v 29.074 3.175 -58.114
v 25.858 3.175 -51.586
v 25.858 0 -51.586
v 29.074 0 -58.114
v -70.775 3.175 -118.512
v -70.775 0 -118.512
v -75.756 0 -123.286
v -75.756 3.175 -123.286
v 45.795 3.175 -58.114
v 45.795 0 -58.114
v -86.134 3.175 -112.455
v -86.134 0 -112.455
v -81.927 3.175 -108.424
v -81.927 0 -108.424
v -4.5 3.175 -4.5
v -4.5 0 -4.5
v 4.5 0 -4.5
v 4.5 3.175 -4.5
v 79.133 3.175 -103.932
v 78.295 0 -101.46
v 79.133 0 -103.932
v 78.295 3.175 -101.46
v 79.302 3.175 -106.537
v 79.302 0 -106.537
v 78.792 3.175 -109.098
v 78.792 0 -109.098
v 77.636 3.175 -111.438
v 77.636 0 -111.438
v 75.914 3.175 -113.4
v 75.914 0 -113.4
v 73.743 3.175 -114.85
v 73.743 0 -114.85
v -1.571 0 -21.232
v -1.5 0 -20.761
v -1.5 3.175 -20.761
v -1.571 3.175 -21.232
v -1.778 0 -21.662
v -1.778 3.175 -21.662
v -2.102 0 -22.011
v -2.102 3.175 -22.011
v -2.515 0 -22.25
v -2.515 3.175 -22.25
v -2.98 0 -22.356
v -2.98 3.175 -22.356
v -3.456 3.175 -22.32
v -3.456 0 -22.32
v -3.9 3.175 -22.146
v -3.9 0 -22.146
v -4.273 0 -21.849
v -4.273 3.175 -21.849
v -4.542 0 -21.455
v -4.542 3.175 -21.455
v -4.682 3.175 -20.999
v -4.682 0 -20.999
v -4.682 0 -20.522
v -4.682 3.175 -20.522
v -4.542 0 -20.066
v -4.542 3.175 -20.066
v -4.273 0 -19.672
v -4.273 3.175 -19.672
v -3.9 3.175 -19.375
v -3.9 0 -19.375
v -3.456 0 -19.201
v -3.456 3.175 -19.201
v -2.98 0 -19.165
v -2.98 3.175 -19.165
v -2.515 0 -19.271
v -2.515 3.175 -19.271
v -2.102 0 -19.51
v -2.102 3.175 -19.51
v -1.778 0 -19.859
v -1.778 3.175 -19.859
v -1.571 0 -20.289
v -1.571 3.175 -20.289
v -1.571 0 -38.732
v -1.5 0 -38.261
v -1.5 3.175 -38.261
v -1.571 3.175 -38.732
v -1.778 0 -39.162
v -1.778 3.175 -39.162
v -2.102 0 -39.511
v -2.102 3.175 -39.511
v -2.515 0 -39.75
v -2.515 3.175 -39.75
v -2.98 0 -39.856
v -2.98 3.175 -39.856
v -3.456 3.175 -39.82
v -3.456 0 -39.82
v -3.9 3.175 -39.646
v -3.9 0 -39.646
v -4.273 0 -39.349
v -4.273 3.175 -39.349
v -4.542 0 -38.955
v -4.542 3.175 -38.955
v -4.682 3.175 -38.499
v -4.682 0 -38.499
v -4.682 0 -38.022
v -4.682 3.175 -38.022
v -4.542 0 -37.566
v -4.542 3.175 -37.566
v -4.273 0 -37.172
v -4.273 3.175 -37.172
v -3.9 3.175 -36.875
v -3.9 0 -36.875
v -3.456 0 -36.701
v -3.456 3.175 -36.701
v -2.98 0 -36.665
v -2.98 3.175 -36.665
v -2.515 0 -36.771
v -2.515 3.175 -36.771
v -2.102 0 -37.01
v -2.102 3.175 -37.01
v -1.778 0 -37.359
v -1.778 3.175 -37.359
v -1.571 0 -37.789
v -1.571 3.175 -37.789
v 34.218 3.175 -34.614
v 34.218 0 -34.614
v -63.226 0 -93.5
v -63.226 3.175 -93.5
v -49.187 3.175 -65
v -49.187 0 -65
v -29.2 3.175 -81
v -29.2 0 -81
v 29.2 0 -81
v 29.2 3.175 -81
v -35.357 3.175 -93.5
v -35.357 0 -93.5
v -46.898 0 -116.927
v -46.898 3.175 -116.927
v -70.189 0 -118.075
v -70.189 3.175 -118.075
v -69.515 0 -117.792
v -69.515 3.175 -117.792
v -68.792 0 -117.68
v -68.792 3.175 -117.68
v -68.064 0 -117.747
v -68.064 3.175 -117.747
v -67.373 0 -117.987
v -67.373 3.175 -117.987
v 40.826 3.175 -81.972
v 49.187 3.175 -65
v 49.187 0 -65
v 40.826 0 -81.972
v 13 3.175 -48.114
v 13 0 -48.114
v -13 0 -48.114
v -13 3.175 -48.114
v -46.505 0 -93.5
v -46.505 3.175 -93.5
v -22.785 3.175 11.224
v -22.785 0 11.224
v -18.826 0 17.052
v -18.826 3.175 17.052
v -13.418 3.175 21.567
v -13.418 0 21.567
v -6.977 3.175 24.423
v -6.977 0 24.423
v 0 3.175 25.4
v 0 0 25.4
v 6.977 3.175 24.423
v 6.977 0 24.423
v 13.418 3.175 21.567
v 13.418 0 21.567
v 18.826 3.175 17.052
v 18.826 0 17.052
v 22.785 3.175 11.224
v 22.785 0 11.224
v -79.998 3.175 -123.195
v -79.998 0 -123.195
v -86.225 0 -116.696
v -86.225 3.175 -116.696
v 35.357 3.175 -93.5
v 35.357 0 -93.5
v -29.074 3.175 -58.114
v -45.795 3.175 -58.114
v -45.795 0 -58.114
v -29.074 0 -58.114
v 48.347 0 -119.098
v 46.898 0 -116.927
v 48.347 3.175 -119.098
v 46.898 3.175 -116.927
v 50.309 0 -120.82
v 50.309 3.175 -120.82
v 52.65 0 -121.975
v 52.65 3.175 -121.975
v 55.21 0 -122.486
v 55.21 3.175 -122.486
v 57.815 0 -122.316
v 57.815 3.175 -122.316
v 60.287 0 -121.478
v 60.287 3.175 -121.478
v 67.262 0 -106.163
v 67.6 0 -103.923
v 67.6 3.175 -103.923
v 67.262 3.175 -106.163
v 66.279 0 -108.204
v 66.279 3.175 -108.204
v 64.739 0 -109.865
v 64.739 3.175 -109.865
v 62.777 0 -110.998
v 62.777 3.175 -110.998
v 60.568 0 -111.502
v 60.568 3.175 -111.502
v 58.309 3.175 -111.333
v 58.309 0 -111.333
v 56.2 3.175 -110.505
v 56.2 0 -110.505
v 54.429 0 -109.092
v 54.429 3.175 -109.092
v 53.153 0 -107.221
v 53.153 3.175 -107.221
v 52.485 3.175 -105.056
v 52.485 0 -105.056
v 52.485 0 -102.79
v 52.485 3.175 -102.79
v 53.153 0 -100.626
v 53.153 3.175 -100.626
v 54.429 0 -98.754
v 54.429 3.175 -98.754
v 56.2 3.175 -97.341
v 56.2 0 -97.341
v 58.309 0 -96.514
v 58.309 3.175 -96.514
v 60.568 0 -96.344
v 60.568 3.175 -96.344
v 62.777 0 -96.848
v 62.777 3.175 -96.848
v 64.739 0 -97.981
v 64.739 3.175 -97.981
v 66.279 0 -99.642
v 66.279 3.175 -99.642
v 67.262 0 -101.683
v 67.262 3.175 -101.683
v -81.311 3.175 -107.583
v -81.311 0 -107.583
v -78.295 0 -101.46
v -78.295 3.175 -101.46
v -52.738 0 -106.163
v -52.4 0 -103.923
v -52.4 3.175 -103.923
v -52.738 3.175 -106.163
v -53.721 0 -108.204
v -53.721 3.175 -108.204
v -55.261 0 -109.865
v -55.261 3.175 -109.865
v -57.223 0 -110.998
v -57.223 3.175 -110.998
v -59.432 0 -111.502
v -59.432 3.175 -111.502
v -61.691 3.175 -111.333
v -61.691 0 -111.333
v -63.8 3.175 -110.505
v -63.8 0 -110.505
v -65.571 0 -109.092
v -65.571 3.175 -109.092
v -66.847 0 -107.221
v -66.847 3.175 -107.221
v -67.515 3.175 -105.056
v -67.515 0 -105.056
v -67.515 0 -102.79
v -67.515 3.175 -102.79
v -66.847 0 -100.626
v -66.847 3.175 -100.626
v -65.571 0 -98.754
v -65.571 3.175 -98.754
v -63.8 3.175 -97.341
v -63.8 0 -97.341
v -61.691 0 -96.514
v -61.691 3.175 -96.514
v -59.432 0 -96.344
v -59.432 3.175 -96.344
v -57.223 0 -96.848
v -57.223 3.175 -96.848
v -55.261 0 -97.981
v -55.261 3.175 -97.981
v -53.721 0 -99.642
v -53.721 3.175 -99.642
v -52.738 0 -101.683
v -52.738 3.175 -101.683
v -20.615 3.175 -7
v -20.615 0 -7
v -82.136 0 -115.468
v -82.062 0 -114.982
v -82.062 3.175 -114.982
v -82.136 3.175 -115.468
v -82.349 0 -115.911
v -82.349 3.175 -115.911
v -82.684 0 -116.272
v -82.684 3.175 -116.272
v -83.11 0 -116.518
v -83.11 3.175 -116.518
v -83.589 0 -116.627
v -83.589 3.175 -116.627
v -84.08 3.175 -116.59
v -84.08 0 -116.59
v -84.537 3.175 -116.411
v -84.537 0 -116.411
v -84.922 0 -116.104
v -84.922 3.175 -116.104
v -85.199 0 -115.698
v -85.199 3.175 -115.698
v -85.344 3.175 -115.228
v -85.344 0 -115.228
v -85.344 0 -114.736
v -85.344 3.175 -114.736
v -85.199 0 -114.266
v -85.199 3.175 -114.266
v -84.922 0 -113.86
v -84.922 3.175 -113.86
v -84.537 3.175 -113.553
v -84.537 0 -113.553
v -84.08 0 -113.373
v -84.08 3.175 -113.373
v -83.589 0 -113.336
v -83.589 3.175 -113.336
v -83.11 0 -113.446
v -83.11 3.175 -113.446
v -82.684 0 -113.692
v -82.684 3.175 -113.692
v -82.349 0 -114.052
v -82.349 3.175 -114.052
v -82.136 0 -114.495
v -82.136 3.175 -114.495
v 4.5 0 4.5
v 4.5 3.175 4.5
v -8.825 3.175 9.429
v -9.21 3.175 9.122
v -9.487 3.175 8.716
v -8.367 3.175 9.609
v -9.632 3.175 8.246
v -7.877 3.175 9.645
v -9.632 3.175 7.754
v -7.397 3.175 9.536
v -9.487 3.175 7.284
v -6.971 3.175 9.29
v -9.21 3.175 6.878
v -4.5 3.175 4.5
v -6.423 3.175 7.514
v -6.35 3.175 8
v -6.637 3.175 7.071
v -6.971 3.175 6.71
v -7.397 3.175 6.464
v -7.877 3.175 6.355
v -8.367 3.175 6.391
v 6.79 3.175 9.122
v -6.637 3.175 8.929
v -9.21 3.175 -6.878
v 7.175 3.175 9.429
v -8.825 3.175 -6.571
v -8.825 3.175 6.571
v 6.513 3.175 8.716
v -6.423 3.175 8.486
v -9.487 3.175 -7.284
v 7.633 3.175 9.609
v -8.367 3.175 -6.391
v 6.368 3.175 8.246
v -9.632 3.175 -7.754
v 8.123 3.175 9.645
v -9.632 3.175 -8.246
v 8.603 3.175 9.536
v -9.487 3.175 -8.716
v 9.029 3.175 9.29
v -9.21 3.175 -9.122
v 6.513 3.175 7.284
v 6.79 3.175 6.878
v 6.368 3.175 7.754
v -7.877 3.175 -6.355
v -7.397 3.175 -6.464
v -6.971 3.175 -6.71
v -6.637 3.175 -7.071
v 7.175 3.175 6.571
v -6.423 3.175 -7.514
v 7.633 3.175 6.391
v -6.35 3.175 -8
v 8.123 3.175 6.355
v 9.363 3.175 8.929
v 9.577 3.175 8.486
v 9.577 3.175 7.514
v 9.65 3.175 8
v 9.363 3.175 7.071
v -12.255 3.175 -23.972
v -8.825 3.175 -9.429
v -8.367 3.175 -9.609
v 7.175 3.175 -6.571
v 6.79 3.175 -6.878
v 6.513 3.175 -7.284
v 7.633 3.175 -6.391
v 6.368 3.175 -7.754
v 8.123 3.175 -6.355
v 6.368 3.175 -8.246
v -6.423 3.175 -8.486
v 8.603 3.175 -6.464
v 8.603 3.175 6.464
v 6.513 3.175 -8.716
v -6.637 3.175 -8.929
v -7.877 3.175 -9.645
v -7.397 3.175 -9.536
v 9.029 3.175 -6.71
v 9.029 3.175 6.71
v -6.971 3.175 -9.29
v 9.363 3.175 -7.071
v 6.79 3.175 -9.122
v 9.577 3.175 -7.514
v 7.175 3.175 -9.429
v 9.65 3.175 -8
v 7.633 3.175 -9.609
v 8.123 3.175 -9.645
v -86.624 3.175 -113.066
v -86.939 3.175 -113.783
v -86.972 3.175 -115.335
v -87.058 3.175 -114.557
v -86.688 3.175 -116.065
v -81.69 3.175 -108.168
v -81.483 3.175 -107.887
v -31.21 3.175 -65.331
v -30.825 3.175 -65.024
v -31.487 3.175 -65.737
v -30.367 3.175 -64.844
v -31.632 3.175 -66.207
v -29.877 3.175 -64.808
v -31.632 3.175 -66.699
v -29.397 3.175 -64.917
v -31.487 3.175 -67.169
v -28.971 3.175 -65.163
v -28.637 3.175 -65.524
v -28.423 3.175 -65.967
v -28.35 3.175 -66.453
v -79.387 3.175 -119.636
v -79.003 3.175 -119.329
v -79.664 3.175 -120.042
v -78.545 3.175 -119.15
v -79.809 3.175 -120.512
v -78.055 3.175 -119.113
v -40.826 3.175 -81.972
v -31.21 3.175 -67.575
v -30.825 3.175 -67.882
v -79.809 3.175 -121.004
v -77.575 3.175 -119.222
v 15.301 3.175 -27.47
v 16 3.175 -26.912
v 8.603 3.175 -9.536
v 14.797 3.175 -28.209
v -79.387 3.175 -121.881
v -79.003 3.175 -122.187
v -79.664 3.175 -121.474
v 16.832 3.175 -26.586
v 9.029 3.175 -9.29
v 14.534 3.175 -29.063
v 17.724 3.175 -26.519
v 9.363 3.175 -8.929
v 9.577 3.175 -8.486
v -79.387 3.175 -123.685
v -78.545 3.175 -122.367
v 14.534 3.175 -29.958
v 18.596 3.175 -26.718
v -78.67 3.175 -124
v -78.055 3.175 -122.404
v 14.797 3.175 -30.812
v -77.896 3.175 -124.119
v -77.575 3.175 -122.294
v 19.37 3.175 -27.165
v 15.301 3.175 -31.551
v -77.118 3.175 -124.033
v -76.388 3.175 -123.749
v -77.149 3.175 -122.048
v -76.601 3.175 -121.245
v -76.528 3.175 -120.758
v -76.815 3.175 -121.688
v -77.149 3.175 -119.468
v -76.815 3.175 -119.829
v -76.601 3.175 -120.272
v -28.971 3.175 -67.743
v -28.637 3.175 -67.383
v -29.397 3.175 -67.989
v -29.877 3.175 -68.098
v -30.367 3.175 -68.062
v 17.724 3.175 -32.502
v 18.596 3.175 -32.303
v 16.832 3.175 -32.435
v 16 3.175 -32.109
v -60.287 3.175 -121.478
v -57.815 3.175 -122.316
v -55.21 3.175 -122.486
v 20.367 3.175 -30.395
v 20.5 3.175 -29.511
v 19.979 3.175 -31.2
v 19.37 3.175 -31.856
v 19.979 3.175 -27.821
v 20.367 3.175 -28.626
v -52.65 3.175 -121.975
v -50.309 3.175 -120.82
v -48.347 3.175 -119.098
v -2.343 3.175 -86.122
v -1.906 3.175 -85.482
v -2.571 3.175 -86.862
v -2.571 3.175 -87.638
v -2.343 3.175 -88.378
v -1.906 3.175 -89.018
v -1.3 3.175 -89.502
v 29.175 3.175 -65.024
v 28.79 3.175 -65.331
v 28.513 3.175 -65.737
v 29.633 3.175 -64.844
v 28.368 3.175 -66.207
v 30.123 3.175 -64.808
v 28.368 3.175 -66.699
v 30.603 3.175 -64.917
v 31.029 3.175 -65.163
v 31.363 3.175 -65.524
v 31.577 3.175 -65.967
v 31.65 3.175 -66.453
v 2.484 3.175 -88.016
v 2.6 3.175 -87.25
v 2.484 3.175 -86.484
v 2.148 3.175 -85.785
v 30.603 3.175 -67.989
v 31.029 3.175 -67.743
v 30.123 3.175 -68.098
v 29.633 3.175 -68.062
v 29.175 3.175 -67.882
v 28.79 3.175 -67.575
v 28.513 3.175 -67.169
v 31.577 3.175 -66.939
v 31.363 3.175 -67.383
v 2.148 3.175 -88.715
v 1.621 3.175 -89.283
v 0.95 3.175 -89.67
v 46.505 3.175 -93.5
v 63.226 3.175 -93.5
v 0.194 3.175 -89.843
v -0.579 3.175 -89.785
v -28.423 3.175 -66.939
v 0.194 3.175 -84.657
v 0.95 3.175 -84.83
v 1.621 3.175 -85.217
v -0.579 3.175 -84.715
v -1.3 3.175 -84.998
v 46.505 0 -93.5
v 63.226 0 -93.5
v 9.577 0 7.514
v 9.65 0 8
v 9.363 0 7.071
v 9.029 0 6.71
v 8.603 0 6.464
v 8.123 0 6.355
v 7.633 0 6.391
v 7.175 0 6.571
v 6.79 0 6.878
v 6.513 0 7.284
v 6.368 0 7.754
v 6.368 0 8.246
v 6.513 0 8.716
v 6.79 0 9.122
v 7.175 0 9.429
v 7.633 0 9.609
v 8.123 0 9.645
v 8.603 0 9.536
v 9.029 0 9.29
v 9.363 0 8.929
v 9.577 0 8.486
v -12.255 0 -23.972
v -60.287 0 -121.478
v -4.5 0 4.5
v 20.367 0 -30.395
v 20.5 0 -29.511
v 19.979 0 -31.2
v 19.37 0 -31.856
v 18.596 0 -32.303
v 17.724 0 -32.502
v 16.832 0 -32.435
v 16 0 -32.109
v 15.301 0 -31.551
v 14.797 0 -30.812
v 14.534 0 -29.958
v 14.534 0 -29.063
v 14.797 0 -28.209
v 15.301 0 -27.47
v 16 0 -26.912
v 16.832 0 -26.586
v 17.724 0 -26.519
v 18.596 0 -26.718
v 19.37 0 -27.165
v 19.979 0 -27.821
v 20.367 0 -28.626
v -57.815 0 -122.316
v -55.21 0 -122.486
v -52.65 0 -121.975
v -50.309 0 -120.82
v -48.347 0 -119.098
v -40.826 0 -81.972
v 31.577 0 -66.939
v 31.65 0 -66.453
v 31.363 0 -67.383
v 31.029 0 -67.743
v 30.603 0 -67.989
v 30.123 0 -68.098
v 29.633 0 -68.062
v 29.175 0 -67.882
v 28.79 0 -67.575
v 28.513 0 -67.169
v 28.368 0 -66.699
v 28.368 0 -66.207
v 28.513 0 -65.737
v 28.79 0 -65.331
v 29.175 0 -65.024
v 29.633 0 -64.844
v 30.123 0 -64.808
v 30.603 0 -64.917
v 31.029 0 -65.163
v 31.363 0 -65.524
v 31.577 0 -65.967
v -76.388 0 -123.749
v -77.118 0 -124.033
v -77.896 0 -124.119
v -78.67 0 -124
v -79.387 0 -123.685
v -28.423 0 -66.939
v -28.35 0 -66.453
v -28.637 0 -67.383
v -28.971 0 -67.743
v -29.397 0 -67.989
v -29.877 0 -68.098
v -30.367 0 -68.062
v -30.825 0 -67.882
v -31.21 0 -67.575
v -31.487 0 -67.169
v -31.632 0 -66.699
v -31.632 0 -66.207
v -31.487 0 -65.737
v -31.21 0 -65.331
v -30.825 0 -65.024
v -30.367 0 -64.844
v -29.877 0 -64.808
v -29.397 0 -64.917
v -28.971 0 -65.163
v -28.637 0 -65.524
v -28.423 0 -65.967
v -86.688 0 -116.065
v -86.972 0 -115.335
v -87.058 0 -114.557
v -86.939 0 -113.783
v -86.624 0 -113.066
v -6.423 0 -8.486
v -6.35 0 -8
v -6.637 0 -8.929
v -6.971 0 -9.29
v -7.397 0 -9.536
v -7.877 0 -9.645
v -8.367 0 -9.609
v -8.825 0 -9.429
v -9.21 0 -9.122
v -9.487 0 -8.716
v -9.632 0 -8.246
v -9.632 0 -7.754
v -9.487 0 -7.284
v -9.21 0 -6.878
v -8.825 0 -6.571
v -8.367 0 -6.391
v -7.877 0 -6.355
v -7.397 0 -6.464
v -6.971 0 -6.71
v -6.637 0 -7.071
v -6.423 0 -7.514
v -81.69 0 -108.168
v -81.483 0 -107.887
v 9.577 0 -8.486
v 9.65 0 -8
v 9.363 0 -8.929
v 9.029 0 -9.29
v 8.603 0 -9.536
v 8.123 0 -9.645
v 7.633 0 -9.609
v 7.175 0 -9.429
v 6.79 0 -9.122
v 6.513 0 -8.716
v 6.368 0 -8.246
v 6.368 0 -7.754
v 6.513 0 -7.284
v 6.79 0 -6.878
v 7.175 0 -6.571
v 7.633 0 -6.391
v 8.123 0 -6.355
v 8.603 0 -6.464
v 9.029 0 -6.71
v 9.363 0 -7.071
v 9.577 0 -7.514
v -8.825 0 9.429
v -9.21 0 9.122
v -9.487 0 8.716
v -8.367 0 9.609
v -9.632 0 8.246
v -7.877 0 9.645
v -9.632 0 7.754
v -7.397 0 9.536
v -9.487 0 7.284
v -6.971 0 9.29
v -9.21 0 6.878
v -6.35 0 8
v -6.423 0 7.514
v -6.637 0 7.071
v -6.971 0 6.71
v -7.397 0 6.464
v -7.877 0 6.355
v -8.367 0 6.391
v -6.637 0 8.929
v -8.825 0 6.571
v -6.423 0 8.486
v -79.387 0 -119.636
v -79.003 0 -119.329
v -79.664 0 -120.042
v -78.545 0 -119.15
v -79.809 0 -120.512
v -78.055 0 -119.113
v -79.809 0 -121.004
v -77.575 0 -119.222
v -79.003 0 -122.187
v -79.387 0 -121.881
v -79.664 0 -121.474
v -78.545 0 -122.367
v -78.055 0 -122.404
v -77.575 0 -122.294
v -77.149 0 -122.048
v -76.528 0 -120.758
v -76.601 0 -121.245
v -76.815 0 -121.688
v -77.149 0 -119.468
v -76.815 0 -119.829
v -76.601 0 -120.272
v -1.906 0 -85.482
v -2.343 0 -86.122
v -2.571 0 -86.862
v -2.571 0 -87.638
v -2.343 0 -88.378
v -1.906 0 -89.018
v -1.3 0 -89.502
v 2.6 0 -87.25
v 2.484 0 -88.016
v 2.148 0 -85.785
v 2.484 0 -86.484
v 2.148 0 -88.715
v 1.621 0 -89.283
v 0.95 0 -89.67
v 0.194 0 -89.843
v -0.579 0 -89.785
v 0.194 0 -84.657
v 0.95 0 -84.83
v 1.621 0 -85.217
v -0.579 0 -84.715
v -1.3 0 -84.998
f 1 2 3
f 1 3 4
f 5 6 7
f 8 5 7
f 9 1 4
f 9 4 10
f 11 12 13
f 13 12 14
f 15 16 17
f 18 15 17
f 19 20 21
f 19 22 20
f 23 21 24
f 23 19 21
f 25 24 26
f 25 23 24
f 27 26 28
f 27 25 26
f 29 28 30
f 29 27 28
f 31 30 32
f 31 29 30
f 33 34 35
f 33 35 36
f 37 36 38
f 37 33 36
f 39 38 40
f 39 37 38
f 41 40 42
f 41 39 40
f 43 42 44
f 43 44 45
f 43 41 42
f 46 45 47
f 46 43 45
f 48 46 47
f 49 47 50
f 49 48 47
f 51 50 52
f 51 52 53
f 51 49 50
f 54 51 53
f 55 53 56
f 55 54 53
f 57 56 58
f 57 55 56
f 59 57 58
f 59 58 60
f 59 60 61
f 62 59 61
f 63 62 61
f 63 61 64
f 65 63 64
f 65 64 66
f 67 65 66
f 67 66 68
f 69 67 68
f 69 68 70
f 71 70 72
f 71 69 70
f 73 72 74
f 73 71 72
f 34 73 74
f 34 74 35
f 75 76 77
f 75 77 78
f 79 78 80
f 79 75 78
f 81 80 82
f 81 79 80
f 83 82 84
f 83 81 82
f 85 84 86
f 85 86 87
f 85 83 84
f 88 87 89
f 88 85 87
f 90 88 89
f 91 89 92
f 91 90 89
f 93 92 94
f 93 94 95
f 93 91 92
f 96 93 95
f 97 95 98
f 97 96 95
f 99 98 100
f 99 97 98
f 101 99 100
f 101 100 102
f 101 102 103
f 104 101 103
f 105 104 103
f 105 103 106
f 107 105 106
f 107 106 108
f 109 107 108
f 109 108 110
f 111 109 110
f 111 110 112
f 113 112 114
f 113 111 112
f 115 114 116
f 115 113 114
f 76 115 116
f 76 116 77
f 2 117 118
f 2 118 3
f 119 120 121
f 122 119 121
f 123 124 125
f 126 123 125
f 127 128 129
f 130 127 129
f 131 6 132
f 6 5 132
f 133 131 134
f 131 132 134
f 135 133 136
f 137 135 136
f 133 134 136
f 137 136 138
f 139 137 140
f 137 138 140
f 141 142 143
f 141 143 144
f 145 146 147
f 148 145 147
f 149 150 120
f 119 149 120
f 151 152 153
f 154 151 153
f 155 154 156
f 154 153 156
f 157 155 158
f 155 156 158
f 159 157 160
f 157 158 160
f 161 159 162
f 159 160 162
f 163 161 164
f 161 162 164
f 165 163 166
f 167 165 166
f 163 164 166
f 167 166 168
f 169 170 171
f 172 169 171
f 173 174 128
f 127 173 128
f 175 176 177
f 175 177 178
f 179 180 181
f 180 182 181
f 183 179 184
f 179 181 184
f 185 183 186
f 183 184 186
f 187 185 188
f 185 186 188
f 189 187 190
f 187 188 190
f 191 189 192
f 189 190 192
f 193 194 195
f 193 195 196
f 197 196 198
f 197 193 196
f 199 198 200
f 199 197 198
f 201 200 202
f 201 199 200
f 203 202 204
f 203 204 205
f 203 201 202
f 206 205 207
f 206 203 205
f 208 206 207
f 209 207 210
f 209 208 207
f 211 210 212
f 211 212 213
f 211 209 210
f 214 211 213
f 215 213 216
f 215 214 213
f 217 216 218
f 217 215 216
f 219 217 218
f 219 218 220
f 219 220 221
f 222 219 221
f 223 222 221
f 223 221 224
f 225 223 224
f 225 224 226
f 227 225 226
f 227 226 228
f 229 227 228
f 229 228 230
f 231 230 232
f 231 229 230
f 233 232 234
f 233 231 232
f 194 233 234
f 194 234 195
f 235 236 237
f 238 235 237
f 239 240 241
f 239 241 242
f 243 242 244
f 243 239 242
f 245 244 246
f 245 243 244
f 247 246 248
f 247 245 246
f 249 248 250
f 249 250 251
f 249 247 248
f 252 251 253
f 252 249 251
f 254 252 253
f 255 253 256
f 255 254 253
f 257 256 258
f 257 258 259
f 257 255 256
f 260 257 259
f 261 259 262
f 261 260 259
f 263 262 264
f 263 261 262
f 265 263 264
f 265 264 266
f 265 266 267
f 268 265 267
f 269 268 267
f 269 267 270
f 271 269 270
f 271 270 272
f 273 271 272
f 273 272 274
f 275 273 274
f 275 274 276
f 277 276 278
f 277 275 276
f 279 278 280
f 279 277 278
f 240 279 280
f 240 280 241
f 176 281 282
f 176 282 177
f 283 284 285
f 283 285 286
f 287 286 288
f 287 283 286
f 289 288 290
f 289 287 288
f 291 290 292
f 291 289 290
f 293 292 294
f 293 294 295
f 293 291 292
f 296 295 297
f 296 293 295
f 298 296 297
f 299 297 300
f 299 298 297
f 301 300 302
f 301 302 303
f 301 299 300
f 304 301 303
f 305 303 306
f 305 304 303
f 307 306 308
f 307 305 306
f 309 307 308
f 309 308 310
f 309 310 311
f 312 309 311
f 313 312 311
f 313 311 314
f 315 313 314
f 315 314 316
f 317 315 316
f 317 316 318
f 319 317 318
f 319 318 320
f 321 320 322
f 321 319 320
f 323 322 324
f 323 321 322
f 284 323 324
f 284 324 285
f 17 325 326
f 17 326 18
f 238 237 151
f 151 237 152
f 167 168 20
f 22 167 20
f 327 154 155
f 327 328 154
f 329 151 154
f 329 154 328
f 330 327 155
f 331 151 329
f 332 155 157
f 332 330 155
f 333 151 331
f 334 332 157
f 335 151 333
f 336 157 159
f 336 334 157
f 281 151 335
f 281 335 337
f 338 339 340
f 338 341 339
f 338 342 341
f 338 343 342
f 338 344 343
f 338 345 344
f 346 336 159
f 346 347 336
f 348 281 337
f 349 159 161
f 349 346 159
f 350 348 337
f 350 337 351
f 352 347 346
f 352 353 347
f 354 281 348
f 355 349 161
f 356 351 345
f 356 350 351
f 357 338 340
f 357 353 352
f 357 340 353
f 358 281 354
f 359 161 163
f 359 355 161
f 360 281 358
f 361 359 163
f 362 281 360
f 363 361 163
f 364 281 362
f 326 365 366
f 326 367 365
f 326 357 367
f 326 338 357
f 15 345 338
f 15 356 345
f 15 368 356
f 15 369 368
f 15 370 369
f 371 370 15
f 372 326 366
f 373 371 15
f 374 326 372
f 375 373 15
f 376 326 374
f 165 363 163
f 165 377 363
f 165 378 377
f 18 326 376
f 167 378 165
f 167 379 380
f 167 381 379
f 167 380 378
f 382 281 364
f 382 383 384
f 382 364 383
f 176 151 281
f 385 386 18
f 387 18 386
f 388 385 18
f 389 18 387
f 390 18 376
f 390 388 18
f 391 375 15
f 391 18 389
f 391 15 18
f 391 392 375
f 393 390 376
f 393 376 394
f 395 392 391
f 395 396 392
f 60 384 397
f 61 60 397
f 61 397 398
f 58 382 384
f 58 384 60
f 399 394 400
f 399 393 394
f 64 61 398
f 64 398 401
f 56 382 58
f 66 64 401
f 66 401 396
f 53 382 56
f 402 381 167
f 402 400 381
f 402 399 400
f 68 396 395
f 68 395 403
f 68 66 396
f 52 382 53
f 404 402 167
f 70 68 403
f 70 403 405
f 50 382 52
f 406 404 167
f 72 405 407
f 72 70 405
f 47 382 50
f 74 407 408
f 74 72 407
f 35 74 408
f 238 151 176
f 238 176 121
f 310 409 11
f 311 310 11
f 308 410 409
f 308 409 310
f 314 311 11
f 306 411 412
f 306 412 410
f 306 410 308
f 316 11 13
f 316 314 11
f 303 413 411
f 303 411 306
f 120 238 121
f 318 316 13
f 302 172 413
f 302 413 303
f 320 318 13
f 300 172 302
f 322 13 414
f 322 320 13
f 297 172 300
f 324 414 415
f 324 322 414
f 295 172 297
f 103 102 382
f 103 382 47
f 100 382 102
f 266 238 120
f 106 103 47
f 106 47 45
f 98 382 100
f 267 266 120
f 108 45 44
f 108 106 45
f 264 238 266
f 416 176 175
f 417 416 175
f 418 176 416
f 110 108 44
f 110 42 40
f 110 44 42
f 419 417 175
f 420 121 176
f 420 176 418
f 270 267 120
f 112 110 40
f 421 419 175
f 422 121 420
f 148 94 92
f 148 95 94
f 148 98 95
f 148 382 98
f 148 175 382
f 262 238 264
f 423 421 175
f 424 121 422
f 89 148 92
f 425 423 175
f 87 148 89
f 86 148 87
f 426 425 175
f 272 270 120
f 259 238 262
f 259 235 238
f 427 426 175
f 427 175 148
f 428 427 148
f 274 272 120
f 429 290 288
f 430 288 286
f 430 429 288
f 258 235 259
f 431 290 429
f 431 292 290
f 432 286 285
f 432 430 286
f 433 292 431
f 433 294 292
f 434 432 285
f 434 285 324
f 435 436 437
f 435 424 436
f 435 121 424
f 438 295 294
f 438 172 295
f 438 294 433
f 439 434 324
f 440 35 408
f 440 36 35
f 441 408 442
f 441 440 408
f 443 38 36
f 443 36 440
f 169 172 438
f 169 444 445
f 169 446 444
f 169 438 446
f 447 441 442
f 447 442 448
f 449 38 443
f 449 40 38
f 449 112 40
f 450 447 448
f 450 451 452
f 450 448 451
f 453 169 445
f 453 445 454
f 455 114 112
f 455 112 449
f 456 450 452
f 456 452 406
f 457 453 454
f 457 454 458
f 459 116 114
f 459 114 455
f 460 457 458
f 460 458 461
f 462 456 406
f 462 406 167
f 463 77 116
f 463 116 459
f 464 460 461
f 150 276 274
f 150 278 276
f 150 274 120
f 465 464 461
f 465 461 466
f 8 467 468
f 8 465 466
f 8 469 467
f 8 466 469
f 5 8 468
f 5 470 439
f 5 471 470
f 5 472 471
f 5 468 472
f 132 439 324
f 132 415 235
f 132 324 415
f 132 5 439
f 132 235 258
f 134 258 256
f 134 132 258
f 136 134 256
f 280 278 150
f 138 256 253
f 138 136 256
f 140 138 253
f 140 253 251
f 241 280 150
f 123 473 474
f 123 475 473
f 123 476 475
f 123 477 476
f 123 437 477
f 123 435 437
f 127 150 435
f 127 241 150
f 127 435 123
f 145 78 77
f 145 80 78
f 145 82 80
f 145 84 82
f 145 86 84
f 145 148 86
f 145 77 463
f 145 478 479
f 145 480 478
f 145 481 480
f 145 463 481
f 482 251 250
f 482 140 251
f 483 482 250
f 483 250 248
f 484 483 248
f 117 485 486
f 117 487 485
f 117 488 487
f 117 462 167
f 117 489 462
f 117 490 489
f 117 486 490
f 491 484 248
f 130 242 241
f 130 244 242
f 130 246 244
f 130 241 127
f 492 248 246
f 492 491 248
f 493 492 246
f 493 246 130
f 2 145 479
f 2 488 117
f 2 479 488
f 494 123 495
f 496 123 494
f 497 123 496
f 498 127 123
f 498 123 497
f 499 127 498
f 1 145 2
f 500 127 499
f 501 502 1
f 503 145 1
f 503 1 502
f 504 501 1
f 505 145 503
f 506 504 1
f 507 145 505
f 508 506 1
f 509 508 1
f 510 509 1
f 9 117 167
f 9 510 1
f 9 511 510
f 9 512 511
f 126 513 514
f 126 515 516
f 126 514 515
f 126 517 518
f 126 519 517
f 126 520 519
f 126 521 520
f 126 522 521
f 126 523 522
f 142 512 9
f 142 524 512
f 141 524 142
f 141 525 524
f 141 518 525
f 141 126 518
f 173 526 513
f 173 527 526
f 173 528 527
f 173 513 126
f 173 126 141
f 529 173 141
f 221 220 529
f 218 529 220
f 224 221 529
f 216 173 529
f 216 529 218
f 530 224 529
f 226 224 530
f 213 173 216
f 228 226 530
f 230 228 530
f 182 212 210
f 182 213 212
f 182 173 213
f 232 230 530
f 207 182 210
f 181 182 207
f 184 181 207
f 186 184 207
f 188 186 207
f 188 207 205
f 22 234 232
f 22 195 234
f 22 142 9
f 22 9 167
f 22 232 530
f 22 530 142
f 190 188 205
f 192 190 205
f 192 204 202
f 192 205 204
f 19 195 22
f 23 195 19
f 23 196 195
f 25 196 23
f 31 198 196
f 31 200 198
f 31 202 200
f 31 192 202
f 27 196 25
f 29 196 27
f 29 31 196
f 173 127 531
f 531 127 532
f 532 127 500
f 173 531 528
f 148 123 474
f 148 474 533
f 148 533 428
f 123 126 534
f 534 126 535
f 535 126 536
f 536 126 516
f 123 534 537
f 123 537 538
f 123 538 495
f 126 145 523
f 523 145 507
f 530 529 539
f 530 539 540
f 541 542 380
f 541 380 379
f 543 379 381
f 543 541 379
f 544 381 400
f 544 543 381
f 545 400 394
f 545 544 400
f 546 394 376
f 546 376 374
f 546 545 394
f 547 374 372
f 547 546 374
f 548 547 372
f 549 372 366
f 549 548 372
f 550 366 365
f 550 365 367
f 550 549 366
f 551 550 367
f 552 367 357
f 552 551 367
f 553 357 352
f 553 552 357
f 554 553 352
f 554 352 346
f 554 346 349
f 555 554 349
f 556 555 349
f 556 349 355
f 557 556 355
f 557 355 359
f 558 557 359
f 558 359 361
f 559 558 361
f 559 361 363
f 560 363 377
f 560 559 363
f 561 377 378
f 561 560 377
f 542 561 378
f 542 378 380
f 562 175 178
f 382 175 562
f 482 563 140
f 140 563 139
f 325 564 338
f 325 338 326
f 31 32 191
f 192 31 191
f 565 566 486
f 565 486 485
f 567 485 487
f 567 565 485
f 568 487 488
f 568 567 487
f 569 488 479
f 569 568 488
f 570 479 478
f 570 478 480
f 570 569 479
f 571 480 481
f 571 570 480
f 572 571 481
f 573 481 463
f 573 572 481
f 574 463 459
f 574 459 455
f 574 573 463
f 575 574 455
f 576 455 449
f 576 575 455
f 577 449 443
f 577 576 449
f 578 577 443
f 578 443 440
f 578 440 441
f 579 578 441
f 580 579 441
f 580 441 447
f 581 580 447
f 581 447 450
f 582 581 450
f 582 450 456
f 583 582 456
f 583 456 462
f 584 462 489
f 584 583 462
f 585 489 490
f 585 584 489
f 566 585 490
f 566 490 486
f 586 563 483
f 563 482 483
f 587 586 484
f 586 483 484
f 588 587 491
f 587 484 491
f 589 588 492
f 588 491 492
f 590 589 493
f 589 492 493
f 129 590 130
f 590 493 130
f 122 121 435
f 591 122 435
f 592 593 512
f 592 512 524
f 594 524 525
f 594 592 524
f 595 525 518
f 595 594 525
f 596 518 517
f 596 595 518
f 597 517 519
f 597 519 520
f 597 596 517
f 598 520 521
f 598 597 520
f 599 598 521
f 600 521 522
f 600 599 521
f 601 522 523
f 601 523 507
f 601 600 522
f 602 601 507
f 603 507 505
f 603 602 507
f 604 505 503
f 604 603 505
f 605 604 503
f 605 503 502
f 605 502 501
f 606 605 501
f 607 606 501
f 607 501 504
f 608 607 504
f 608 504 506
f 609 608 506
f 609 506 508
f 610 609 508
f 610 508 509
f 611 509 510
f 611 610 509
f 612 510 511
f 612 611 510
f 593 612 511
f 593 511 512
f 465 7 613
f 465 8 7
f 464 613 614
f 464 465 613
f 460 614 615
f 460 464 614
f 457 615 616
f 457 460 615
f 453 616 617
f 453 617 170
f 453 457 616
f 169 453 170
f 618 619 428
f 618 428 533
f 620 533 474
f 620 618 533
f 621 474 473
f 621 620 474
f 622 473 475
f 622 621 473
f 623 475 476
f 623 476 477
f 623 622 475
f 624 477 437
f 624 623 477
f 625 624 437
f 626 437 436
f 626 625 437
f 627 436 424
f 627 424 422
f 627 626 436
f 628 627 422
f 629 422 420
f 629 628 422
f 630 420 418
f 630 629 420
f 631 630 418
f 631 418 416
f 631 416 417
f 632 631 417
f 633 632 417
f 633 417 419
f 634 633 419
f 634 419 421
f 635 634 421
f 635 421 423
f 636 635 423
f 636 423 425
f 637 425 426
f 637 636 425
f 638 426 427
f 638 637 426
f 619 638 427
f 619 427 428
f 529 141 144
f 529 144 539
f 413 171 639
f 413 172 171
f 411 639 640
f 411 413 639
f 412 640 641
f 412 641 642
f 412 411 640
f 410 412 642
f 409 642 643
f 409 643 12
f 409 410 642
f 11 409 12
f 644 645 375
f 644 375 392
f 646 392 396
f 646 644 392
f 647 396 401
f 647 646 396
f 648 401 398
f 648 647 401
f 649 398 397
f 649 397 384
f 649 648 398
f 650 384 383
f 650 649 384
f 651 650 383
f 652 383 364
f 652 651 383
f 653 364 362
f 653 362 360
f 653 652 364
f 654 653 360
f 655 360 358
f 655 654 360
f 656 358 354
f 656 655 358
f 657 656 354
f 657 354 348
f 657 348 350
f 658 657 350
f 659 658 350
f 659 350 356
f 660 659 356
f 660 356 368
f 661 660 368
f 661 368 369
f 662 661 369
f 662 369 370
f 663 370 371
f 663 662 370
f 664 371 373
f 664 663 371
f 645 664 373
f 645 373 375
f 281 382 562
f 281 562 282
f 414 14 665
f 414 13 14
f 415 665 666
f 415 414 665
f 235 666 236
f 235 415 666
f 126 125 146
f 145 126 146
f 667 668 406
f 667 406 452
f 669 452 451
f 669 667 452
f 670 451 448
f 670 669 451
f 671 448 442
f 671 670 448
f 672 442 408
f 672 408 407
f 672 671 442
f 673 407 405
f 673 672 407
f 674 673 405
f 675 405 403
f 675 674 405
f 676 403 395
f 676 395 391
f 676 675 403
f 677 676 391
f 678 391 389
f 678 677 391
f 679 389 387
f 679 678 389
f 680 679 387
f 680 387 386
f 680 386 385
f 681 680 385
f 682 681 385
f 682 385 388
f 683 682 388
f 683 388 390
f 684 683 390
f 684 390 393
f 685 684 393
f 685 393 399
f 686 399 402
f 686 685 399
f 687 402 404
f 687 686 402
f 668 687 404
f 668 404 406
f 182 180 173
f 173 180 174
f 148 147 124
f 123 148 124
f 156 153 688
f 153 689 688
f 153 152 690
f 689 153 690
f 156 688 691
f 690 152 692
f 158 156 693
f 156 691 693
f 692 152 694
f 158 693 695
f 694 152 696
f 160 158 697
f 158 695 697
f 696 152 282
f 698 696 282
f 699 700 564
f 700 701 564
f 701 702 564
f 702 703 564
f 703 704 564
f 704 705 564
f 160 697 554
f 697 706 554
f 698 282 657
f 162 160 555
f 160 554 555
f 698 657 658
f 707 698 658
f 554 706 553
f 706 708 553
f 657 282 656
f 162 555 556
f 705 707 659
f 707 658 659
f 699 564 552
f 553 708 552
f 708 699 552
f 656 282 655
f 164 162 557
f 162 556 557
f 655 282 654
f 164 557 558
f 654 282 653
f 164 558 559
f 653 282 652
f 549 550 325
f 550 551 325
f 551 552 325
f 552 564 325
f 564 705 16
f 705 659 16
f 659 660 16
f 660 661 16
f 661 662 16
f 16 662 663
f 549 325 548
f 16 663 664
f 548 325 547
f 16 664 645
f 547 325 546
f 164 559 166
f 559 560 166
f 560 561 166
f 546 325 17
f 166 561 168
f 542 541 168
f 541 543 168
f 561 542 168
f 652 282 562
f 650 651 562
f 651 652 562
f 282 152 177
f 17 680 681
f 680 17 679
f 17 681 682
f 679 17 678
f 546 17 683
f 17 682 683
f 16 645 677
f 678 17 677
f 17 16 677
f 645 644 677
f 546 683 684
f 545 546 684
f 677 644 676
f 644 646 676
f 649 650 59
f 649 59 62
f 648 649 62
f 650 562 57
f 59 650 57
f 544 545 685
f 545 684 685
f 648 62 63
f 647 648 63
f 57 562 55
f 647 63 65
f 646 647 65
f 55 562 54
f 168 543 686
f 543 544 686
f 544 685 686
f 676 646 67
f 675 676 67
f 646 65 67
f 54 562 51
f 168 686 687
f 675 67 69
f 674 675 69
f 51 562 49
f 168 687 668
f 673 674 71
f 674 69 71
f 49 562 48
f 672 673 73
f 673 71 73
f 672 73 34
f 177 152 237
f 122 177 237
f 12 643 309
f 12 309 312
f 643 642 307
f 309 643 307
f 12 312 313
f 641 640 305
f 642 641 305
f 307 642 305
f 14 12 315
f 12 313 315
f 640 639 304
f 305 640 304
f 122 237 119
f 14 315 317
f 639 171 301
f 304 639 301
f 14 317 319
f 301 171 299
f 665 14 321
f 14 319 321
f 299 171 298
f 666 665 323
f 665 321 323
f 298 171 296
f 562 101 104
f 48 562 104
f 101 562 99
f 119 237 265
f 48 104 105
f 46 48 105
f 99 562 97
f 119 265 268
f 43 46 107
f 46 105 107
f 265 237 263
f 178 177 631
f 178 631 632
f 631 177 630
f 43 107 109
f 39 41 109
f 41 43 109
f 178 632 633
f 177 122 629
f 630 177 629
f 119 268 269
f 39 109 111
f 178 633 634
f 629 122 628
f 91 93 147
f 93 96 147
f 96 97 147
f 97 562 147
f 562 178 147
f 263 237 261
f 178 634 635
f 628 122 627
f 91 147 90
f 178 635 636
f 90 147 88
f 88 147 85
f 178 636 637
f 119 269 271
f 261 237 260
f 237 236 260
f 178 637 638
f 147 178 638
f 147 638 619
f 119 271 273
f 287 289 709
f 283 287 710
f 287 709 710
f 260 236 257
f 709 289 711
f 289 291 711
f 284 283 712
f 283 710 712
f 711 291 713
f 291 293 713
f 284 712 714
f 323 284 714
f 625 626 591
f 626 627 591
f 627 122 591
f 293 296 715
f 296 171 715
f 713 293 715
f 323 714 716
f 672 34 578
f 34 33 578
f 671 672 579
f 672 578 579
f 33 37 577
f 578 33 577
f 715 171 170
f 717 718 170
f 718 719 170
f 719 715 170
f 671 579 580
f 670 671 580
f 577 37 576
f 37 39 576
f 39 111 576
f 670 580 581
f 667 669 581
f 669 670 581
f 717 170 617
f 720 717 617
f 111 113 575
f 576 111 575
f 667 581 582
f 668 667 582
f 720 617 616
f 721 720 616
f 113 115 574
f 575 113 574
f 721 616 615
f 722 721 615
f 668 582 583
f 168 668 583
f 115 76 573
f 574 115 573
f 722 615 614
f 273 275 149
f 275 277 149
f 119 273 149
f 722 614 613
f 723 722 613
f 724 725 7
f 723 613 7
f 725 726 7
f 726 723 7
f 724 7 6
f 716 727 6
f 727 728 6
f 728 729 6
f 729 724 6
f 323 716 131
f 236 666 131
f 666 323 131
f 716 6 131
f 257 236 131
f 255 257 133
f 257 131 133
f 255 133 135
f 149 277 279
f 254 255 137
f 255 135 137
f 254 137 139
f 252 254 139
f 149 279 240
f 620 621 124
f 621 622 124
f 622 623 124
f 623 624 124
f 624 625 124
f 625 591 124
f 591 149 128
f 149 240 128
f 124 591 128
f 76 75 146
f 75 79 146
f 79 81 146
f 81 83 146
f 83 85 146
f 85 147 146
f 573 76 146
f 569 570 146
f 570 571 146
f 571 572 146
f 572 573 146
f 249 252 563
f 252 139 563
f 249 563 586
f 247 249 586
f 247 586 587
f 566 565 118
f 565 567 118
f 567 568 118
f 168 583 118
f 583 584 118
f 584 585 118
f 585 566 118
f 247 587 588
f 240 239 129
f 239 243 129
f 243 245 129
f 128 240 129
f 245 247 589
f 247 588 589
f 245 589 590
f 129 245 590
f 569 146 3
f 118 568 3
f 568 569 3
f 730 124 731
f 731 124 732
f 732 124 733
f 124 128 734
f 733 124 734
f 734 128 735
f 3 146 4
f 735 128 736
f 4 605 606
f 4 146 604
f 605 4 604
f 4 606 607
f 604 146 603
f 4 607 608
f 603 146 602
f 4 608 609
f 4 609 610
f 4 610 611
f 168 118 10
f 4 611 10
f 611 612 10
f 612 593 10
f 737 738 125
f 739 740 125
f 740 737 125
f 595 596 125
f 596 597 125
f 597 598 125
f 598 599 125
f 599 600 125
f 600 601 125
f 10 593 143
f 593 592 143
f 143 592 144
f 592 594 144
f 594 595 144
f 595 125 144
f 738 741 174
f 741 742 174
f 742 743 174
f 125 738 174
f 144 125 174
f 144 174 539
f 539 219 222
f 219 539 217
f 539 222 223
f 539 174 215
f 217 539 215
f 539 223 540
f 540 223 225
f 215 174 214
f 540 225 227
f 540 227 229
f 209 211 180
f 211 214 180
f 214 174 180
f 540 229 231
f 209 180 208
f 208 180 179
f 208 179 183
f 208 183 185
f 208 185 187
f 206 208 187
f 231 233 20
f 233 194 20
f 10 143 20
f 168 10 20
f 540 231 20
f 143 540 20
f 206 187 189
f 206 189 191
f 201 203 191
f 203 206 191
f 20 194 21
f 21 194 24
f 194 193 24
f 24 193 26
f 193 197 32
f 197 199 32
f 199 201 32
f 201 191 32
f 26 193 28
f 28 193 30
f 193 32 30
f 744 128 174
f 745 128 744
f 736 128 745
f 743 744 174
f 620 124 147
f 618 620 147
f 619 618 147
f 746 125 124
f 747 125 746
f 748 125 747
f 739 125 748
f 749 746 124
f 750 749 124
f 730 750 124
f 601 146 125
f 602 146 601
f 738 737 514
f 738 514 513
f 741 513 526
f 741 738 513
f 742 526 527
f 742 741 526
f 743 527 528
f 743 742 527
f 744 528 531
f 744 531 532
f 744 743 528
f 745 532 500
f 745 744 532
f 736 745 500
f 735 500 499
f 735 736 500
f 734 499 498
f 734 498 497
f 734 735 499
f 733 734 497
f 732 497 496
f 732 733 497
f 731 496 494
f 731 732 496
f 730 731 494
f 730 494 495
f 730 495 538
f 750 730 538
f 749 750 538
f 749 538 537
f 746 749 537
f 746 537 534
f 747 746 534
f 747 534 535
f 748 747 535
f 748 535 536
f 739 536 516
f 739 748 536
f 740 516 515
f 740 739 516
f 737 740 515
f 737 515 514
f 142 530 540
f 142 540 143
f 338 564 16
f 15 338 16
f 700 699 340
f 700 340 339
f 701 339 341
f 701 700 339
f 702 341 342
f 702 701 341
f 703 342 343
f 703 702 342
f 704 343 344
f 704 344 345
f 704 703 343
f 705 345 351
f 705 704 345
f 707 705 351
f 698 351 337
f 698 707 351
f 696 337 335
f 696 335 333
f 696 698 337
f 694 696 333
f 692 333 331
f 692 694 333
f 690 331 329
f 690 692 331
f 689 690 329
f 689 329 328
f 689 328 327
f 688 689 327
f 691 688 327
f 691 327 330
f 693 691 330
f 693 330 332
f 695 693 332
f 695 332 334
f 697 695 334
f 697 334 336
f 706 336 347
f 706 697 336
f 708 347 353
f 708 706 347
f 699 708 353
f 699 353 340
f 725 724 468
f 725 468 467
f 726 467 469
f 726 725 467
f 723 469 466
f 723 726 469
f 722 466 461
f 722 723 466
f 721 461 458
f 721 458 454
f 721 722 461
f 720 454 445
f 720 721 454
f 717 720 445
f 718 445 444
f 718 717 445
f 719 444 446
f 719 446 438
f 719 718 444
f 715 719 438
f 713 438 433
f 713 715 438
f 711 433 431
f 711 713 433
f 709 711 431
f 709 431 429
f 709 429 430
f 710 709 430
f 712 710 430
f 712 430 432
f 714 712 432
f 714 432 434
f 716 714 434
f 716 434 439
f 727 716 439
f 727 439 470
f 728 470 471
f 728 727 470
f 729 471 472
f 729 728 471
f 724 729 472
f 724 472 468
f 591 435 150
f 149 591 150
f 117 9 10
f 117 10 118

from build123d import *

# Parameters (mm, degrees)
SKETCH1_R               = 1.65
SKETCH1_W               = 9
SKETCH1_H               = 9
SKETCH1_R_2             = 1.6
SKETCH1_R_3             = 3
SKETCH1_R_4             = 7.6
SKETCH1_R_5             = 2.6
BOSS_EXTRUDE1_DEPTH     = 3.175
FILLET1_R               = 10
CUT_EXTRUDE1_DEPTH      = 1
CUT_EXTRUDE1_DEPTH_BACK = 4.175
SKETCH3_R               = 1.65
BOSS_EXTRUDE2_DEPTH     = 3.175
FILLET2_R               = 3


with BuildPart() as part:
    # Sketch1 → Boss-Extrude1 (new body)
    with BuildSketch(Plane(origin=(0, 0, 0), x_dir=(1, 0, 0), z_dir=(0, 1, 0))):
        with BuildLine():
            Line((-51.31658538, 125.897213638), (-82.713802404, 110.430644428))
            Line((-82.713802404, 110.430644428), (-22.785408926, -11.224310227))
            ThreePointArc((-22.785408926, -11.224310227), (0, -25.4), (22.785408926, -11.224310227))
            Line((22.785408926, -11.224310227), (82.713802404, 110.430644428))
            Line((82.713802404, 110.430644428), (51.31658538, 125.897213638))
            Line((51.31658538, 125.897213638), (35.357408279, 93.5))
            Line((35.357408279, 93.5), (-35.357408279, 93.5))
            Line((-35.357408279, 93.5), (-51.31658538, 125.897213638))
        make_face()
        Polygon((-29.1997888, 81), (29.1997888, 81), (13, 48.114343343), (-13, 48.114343343), align=None, mode=Mode.SUBTRACT)
        with Locations((-8, -8)):
            Circle(SKETCH1_R, mode=Mode.SUBTRACT)
        Rectangle(SKETCH1_W, SKETCH1_H, mode=Mode.SUBTRACT)
        with Locations((-8, 8)):
            Circle(SKETCH1_R, mode=Mode.SUBTRACT)
        with Locations((-3.1, 20.76053754)):
            Circle(SKETCH1_R_2, mode=Mode.SUBTRACT)
        with Locations((8, -8)):
            Circle(SKETCH1_R, mode=Mode.SUBTRACT)
        with Locations((8, 8)):
            Circle(SKETCH1_R, mode=Mode.SUBTRACT)
        with Locations((17.5, 29.51053754)):
            Circle(SKETCH1_R_3, mode=Mode.SUBTRACT)
        with Locations((-30, 66.453060464)):
            Circle(SKETCH1_R, mode=Mode.SUBTRACT)
        with Locations((-60, 103.923048454)):
            Circle(SKETCH1_R_4, mode=Mode.SUBTRACT)
        with Locations((30, 66.453060464)):
            Circle(SKETCH1_R, mode=Mode.SUBTRACT)
        with Locations((60, 103.923048454)):
            Circle(SKETCH1_R_4, mode=Mode.SUBTRACT)
        with Locations((0, 87.25)):
            Circle(SKETCH1_R_5, mode=Mode.SUBTRACT)
        with Locations((-3.1, 38.26053754)):
            Circle(SKETCH1_R_2, mode=Mode.SUBTRACT)
    extrude(amount=BOSS_EXTRUDE1_DEPTH)

    # Fillet1
    fillet1_edges = [part.edges().sort_by_distance(p)[0] for p in [
        (51.31658538, 1.5875, -125.897213638),
        (82.713802404, 1.5875, -110.430644428),
        (-82.713802404, 1.5875, -110.430644428),
        (-51.31658538, 1.5875, -125.897213638),
    ]]
    fillet(fillet1_edges, radius=FILLET1_R)

    # Sketch2 → Cut-Extrude1 (cut, two sides)
    with BuildSketch(Plane(origin=(0, 3.175, 0), x_dir=(1, 0, 0), z_dir=(0, 1, 0))) as cut_extrude1_sk:
        Polygon((-45.79480762, 58.114343343), (-29.073580398, 58.114343343), (-12.254779912, 23.972089701), (-20.615393523, 7), align=None)
        Polygon((-63.226120316, 93.5), (-49.186747904, 65), (-40.826134293, 81.972089701), (-46.504893094, 93.5), align=None)
        Polygon((29.073580398, 58.114343343), (45.79480762, 58.114343343), (34.218483, 34.614343343), (25.857869389, 51.586433044), align=None)
        Polygon((46.504893094, 93.5), (63.226120316, 93.5), (49.186747904, 65), (40.826134293, 81.972089701), align=None)
    extrude(amount=CUT_EXTRUDE1_DEPTH, mode=Mode.SUBTRACT)
    extrude(cut_extrude1_sk.sketch, amount=-CUT_EXTRUDE1_DEPTH_BACK, mode=Mode.SUBTRACT)

    # Sketch3 → Boss-Extrude2 (add)
    with BuildSketch(Plane(origin=(0, 0, 0), x_dir=(1, 0, 0), z_dir=(0, 1, 0))):
        with BuildLine():
            Line((-69.257852251, 117.059174089), (-77.922641378, 125.361067209))
            Line((-77.922641378, 125.361067209), (-88.300007778, 114.5300808))
            Line((-88.300007778, 114.5300808), (-81.545013782, 108.057997365))
            Line((-81.545013782, 108.057997365), (-78.29478263, 101.460010992))
            ThreePointArc((-78.29478263, 101.460010992), (-78.792063776, 109.097507652), (-73.743168968, 114.849664202))
            Line((-73.743168968, 114.849664202), (-69.257852251, 117.059174089))
        make_face()
        with Locations((-78.17782959, 120.758363767)):
            Circle(SKETCH3_R, mode=Mode.SUBTRACT)
        with Locations((-83.712425003, 114.981837682)):
            Circle(SKETCH3_R, mode=Mode.SUBTRACT)
    extrude(amount=BOSS_EXTRUDE2_DEPTH)

    # Fillet2
    fillet2_edges = [part.edges().sort_by_distance(p)[0] for p in [
        (-81.545013782, 1.5875, -108.057997365),
        (-88.300007778, 1.5875, -114.5300808),
        (-77.922641378, 1.5875, -125.361067209),
        (-69.257852251, 1.5875, -117.059174089),
    ]]
    fillet(fillet2_edges, radius=FILLET2_R)


solid = part.part
